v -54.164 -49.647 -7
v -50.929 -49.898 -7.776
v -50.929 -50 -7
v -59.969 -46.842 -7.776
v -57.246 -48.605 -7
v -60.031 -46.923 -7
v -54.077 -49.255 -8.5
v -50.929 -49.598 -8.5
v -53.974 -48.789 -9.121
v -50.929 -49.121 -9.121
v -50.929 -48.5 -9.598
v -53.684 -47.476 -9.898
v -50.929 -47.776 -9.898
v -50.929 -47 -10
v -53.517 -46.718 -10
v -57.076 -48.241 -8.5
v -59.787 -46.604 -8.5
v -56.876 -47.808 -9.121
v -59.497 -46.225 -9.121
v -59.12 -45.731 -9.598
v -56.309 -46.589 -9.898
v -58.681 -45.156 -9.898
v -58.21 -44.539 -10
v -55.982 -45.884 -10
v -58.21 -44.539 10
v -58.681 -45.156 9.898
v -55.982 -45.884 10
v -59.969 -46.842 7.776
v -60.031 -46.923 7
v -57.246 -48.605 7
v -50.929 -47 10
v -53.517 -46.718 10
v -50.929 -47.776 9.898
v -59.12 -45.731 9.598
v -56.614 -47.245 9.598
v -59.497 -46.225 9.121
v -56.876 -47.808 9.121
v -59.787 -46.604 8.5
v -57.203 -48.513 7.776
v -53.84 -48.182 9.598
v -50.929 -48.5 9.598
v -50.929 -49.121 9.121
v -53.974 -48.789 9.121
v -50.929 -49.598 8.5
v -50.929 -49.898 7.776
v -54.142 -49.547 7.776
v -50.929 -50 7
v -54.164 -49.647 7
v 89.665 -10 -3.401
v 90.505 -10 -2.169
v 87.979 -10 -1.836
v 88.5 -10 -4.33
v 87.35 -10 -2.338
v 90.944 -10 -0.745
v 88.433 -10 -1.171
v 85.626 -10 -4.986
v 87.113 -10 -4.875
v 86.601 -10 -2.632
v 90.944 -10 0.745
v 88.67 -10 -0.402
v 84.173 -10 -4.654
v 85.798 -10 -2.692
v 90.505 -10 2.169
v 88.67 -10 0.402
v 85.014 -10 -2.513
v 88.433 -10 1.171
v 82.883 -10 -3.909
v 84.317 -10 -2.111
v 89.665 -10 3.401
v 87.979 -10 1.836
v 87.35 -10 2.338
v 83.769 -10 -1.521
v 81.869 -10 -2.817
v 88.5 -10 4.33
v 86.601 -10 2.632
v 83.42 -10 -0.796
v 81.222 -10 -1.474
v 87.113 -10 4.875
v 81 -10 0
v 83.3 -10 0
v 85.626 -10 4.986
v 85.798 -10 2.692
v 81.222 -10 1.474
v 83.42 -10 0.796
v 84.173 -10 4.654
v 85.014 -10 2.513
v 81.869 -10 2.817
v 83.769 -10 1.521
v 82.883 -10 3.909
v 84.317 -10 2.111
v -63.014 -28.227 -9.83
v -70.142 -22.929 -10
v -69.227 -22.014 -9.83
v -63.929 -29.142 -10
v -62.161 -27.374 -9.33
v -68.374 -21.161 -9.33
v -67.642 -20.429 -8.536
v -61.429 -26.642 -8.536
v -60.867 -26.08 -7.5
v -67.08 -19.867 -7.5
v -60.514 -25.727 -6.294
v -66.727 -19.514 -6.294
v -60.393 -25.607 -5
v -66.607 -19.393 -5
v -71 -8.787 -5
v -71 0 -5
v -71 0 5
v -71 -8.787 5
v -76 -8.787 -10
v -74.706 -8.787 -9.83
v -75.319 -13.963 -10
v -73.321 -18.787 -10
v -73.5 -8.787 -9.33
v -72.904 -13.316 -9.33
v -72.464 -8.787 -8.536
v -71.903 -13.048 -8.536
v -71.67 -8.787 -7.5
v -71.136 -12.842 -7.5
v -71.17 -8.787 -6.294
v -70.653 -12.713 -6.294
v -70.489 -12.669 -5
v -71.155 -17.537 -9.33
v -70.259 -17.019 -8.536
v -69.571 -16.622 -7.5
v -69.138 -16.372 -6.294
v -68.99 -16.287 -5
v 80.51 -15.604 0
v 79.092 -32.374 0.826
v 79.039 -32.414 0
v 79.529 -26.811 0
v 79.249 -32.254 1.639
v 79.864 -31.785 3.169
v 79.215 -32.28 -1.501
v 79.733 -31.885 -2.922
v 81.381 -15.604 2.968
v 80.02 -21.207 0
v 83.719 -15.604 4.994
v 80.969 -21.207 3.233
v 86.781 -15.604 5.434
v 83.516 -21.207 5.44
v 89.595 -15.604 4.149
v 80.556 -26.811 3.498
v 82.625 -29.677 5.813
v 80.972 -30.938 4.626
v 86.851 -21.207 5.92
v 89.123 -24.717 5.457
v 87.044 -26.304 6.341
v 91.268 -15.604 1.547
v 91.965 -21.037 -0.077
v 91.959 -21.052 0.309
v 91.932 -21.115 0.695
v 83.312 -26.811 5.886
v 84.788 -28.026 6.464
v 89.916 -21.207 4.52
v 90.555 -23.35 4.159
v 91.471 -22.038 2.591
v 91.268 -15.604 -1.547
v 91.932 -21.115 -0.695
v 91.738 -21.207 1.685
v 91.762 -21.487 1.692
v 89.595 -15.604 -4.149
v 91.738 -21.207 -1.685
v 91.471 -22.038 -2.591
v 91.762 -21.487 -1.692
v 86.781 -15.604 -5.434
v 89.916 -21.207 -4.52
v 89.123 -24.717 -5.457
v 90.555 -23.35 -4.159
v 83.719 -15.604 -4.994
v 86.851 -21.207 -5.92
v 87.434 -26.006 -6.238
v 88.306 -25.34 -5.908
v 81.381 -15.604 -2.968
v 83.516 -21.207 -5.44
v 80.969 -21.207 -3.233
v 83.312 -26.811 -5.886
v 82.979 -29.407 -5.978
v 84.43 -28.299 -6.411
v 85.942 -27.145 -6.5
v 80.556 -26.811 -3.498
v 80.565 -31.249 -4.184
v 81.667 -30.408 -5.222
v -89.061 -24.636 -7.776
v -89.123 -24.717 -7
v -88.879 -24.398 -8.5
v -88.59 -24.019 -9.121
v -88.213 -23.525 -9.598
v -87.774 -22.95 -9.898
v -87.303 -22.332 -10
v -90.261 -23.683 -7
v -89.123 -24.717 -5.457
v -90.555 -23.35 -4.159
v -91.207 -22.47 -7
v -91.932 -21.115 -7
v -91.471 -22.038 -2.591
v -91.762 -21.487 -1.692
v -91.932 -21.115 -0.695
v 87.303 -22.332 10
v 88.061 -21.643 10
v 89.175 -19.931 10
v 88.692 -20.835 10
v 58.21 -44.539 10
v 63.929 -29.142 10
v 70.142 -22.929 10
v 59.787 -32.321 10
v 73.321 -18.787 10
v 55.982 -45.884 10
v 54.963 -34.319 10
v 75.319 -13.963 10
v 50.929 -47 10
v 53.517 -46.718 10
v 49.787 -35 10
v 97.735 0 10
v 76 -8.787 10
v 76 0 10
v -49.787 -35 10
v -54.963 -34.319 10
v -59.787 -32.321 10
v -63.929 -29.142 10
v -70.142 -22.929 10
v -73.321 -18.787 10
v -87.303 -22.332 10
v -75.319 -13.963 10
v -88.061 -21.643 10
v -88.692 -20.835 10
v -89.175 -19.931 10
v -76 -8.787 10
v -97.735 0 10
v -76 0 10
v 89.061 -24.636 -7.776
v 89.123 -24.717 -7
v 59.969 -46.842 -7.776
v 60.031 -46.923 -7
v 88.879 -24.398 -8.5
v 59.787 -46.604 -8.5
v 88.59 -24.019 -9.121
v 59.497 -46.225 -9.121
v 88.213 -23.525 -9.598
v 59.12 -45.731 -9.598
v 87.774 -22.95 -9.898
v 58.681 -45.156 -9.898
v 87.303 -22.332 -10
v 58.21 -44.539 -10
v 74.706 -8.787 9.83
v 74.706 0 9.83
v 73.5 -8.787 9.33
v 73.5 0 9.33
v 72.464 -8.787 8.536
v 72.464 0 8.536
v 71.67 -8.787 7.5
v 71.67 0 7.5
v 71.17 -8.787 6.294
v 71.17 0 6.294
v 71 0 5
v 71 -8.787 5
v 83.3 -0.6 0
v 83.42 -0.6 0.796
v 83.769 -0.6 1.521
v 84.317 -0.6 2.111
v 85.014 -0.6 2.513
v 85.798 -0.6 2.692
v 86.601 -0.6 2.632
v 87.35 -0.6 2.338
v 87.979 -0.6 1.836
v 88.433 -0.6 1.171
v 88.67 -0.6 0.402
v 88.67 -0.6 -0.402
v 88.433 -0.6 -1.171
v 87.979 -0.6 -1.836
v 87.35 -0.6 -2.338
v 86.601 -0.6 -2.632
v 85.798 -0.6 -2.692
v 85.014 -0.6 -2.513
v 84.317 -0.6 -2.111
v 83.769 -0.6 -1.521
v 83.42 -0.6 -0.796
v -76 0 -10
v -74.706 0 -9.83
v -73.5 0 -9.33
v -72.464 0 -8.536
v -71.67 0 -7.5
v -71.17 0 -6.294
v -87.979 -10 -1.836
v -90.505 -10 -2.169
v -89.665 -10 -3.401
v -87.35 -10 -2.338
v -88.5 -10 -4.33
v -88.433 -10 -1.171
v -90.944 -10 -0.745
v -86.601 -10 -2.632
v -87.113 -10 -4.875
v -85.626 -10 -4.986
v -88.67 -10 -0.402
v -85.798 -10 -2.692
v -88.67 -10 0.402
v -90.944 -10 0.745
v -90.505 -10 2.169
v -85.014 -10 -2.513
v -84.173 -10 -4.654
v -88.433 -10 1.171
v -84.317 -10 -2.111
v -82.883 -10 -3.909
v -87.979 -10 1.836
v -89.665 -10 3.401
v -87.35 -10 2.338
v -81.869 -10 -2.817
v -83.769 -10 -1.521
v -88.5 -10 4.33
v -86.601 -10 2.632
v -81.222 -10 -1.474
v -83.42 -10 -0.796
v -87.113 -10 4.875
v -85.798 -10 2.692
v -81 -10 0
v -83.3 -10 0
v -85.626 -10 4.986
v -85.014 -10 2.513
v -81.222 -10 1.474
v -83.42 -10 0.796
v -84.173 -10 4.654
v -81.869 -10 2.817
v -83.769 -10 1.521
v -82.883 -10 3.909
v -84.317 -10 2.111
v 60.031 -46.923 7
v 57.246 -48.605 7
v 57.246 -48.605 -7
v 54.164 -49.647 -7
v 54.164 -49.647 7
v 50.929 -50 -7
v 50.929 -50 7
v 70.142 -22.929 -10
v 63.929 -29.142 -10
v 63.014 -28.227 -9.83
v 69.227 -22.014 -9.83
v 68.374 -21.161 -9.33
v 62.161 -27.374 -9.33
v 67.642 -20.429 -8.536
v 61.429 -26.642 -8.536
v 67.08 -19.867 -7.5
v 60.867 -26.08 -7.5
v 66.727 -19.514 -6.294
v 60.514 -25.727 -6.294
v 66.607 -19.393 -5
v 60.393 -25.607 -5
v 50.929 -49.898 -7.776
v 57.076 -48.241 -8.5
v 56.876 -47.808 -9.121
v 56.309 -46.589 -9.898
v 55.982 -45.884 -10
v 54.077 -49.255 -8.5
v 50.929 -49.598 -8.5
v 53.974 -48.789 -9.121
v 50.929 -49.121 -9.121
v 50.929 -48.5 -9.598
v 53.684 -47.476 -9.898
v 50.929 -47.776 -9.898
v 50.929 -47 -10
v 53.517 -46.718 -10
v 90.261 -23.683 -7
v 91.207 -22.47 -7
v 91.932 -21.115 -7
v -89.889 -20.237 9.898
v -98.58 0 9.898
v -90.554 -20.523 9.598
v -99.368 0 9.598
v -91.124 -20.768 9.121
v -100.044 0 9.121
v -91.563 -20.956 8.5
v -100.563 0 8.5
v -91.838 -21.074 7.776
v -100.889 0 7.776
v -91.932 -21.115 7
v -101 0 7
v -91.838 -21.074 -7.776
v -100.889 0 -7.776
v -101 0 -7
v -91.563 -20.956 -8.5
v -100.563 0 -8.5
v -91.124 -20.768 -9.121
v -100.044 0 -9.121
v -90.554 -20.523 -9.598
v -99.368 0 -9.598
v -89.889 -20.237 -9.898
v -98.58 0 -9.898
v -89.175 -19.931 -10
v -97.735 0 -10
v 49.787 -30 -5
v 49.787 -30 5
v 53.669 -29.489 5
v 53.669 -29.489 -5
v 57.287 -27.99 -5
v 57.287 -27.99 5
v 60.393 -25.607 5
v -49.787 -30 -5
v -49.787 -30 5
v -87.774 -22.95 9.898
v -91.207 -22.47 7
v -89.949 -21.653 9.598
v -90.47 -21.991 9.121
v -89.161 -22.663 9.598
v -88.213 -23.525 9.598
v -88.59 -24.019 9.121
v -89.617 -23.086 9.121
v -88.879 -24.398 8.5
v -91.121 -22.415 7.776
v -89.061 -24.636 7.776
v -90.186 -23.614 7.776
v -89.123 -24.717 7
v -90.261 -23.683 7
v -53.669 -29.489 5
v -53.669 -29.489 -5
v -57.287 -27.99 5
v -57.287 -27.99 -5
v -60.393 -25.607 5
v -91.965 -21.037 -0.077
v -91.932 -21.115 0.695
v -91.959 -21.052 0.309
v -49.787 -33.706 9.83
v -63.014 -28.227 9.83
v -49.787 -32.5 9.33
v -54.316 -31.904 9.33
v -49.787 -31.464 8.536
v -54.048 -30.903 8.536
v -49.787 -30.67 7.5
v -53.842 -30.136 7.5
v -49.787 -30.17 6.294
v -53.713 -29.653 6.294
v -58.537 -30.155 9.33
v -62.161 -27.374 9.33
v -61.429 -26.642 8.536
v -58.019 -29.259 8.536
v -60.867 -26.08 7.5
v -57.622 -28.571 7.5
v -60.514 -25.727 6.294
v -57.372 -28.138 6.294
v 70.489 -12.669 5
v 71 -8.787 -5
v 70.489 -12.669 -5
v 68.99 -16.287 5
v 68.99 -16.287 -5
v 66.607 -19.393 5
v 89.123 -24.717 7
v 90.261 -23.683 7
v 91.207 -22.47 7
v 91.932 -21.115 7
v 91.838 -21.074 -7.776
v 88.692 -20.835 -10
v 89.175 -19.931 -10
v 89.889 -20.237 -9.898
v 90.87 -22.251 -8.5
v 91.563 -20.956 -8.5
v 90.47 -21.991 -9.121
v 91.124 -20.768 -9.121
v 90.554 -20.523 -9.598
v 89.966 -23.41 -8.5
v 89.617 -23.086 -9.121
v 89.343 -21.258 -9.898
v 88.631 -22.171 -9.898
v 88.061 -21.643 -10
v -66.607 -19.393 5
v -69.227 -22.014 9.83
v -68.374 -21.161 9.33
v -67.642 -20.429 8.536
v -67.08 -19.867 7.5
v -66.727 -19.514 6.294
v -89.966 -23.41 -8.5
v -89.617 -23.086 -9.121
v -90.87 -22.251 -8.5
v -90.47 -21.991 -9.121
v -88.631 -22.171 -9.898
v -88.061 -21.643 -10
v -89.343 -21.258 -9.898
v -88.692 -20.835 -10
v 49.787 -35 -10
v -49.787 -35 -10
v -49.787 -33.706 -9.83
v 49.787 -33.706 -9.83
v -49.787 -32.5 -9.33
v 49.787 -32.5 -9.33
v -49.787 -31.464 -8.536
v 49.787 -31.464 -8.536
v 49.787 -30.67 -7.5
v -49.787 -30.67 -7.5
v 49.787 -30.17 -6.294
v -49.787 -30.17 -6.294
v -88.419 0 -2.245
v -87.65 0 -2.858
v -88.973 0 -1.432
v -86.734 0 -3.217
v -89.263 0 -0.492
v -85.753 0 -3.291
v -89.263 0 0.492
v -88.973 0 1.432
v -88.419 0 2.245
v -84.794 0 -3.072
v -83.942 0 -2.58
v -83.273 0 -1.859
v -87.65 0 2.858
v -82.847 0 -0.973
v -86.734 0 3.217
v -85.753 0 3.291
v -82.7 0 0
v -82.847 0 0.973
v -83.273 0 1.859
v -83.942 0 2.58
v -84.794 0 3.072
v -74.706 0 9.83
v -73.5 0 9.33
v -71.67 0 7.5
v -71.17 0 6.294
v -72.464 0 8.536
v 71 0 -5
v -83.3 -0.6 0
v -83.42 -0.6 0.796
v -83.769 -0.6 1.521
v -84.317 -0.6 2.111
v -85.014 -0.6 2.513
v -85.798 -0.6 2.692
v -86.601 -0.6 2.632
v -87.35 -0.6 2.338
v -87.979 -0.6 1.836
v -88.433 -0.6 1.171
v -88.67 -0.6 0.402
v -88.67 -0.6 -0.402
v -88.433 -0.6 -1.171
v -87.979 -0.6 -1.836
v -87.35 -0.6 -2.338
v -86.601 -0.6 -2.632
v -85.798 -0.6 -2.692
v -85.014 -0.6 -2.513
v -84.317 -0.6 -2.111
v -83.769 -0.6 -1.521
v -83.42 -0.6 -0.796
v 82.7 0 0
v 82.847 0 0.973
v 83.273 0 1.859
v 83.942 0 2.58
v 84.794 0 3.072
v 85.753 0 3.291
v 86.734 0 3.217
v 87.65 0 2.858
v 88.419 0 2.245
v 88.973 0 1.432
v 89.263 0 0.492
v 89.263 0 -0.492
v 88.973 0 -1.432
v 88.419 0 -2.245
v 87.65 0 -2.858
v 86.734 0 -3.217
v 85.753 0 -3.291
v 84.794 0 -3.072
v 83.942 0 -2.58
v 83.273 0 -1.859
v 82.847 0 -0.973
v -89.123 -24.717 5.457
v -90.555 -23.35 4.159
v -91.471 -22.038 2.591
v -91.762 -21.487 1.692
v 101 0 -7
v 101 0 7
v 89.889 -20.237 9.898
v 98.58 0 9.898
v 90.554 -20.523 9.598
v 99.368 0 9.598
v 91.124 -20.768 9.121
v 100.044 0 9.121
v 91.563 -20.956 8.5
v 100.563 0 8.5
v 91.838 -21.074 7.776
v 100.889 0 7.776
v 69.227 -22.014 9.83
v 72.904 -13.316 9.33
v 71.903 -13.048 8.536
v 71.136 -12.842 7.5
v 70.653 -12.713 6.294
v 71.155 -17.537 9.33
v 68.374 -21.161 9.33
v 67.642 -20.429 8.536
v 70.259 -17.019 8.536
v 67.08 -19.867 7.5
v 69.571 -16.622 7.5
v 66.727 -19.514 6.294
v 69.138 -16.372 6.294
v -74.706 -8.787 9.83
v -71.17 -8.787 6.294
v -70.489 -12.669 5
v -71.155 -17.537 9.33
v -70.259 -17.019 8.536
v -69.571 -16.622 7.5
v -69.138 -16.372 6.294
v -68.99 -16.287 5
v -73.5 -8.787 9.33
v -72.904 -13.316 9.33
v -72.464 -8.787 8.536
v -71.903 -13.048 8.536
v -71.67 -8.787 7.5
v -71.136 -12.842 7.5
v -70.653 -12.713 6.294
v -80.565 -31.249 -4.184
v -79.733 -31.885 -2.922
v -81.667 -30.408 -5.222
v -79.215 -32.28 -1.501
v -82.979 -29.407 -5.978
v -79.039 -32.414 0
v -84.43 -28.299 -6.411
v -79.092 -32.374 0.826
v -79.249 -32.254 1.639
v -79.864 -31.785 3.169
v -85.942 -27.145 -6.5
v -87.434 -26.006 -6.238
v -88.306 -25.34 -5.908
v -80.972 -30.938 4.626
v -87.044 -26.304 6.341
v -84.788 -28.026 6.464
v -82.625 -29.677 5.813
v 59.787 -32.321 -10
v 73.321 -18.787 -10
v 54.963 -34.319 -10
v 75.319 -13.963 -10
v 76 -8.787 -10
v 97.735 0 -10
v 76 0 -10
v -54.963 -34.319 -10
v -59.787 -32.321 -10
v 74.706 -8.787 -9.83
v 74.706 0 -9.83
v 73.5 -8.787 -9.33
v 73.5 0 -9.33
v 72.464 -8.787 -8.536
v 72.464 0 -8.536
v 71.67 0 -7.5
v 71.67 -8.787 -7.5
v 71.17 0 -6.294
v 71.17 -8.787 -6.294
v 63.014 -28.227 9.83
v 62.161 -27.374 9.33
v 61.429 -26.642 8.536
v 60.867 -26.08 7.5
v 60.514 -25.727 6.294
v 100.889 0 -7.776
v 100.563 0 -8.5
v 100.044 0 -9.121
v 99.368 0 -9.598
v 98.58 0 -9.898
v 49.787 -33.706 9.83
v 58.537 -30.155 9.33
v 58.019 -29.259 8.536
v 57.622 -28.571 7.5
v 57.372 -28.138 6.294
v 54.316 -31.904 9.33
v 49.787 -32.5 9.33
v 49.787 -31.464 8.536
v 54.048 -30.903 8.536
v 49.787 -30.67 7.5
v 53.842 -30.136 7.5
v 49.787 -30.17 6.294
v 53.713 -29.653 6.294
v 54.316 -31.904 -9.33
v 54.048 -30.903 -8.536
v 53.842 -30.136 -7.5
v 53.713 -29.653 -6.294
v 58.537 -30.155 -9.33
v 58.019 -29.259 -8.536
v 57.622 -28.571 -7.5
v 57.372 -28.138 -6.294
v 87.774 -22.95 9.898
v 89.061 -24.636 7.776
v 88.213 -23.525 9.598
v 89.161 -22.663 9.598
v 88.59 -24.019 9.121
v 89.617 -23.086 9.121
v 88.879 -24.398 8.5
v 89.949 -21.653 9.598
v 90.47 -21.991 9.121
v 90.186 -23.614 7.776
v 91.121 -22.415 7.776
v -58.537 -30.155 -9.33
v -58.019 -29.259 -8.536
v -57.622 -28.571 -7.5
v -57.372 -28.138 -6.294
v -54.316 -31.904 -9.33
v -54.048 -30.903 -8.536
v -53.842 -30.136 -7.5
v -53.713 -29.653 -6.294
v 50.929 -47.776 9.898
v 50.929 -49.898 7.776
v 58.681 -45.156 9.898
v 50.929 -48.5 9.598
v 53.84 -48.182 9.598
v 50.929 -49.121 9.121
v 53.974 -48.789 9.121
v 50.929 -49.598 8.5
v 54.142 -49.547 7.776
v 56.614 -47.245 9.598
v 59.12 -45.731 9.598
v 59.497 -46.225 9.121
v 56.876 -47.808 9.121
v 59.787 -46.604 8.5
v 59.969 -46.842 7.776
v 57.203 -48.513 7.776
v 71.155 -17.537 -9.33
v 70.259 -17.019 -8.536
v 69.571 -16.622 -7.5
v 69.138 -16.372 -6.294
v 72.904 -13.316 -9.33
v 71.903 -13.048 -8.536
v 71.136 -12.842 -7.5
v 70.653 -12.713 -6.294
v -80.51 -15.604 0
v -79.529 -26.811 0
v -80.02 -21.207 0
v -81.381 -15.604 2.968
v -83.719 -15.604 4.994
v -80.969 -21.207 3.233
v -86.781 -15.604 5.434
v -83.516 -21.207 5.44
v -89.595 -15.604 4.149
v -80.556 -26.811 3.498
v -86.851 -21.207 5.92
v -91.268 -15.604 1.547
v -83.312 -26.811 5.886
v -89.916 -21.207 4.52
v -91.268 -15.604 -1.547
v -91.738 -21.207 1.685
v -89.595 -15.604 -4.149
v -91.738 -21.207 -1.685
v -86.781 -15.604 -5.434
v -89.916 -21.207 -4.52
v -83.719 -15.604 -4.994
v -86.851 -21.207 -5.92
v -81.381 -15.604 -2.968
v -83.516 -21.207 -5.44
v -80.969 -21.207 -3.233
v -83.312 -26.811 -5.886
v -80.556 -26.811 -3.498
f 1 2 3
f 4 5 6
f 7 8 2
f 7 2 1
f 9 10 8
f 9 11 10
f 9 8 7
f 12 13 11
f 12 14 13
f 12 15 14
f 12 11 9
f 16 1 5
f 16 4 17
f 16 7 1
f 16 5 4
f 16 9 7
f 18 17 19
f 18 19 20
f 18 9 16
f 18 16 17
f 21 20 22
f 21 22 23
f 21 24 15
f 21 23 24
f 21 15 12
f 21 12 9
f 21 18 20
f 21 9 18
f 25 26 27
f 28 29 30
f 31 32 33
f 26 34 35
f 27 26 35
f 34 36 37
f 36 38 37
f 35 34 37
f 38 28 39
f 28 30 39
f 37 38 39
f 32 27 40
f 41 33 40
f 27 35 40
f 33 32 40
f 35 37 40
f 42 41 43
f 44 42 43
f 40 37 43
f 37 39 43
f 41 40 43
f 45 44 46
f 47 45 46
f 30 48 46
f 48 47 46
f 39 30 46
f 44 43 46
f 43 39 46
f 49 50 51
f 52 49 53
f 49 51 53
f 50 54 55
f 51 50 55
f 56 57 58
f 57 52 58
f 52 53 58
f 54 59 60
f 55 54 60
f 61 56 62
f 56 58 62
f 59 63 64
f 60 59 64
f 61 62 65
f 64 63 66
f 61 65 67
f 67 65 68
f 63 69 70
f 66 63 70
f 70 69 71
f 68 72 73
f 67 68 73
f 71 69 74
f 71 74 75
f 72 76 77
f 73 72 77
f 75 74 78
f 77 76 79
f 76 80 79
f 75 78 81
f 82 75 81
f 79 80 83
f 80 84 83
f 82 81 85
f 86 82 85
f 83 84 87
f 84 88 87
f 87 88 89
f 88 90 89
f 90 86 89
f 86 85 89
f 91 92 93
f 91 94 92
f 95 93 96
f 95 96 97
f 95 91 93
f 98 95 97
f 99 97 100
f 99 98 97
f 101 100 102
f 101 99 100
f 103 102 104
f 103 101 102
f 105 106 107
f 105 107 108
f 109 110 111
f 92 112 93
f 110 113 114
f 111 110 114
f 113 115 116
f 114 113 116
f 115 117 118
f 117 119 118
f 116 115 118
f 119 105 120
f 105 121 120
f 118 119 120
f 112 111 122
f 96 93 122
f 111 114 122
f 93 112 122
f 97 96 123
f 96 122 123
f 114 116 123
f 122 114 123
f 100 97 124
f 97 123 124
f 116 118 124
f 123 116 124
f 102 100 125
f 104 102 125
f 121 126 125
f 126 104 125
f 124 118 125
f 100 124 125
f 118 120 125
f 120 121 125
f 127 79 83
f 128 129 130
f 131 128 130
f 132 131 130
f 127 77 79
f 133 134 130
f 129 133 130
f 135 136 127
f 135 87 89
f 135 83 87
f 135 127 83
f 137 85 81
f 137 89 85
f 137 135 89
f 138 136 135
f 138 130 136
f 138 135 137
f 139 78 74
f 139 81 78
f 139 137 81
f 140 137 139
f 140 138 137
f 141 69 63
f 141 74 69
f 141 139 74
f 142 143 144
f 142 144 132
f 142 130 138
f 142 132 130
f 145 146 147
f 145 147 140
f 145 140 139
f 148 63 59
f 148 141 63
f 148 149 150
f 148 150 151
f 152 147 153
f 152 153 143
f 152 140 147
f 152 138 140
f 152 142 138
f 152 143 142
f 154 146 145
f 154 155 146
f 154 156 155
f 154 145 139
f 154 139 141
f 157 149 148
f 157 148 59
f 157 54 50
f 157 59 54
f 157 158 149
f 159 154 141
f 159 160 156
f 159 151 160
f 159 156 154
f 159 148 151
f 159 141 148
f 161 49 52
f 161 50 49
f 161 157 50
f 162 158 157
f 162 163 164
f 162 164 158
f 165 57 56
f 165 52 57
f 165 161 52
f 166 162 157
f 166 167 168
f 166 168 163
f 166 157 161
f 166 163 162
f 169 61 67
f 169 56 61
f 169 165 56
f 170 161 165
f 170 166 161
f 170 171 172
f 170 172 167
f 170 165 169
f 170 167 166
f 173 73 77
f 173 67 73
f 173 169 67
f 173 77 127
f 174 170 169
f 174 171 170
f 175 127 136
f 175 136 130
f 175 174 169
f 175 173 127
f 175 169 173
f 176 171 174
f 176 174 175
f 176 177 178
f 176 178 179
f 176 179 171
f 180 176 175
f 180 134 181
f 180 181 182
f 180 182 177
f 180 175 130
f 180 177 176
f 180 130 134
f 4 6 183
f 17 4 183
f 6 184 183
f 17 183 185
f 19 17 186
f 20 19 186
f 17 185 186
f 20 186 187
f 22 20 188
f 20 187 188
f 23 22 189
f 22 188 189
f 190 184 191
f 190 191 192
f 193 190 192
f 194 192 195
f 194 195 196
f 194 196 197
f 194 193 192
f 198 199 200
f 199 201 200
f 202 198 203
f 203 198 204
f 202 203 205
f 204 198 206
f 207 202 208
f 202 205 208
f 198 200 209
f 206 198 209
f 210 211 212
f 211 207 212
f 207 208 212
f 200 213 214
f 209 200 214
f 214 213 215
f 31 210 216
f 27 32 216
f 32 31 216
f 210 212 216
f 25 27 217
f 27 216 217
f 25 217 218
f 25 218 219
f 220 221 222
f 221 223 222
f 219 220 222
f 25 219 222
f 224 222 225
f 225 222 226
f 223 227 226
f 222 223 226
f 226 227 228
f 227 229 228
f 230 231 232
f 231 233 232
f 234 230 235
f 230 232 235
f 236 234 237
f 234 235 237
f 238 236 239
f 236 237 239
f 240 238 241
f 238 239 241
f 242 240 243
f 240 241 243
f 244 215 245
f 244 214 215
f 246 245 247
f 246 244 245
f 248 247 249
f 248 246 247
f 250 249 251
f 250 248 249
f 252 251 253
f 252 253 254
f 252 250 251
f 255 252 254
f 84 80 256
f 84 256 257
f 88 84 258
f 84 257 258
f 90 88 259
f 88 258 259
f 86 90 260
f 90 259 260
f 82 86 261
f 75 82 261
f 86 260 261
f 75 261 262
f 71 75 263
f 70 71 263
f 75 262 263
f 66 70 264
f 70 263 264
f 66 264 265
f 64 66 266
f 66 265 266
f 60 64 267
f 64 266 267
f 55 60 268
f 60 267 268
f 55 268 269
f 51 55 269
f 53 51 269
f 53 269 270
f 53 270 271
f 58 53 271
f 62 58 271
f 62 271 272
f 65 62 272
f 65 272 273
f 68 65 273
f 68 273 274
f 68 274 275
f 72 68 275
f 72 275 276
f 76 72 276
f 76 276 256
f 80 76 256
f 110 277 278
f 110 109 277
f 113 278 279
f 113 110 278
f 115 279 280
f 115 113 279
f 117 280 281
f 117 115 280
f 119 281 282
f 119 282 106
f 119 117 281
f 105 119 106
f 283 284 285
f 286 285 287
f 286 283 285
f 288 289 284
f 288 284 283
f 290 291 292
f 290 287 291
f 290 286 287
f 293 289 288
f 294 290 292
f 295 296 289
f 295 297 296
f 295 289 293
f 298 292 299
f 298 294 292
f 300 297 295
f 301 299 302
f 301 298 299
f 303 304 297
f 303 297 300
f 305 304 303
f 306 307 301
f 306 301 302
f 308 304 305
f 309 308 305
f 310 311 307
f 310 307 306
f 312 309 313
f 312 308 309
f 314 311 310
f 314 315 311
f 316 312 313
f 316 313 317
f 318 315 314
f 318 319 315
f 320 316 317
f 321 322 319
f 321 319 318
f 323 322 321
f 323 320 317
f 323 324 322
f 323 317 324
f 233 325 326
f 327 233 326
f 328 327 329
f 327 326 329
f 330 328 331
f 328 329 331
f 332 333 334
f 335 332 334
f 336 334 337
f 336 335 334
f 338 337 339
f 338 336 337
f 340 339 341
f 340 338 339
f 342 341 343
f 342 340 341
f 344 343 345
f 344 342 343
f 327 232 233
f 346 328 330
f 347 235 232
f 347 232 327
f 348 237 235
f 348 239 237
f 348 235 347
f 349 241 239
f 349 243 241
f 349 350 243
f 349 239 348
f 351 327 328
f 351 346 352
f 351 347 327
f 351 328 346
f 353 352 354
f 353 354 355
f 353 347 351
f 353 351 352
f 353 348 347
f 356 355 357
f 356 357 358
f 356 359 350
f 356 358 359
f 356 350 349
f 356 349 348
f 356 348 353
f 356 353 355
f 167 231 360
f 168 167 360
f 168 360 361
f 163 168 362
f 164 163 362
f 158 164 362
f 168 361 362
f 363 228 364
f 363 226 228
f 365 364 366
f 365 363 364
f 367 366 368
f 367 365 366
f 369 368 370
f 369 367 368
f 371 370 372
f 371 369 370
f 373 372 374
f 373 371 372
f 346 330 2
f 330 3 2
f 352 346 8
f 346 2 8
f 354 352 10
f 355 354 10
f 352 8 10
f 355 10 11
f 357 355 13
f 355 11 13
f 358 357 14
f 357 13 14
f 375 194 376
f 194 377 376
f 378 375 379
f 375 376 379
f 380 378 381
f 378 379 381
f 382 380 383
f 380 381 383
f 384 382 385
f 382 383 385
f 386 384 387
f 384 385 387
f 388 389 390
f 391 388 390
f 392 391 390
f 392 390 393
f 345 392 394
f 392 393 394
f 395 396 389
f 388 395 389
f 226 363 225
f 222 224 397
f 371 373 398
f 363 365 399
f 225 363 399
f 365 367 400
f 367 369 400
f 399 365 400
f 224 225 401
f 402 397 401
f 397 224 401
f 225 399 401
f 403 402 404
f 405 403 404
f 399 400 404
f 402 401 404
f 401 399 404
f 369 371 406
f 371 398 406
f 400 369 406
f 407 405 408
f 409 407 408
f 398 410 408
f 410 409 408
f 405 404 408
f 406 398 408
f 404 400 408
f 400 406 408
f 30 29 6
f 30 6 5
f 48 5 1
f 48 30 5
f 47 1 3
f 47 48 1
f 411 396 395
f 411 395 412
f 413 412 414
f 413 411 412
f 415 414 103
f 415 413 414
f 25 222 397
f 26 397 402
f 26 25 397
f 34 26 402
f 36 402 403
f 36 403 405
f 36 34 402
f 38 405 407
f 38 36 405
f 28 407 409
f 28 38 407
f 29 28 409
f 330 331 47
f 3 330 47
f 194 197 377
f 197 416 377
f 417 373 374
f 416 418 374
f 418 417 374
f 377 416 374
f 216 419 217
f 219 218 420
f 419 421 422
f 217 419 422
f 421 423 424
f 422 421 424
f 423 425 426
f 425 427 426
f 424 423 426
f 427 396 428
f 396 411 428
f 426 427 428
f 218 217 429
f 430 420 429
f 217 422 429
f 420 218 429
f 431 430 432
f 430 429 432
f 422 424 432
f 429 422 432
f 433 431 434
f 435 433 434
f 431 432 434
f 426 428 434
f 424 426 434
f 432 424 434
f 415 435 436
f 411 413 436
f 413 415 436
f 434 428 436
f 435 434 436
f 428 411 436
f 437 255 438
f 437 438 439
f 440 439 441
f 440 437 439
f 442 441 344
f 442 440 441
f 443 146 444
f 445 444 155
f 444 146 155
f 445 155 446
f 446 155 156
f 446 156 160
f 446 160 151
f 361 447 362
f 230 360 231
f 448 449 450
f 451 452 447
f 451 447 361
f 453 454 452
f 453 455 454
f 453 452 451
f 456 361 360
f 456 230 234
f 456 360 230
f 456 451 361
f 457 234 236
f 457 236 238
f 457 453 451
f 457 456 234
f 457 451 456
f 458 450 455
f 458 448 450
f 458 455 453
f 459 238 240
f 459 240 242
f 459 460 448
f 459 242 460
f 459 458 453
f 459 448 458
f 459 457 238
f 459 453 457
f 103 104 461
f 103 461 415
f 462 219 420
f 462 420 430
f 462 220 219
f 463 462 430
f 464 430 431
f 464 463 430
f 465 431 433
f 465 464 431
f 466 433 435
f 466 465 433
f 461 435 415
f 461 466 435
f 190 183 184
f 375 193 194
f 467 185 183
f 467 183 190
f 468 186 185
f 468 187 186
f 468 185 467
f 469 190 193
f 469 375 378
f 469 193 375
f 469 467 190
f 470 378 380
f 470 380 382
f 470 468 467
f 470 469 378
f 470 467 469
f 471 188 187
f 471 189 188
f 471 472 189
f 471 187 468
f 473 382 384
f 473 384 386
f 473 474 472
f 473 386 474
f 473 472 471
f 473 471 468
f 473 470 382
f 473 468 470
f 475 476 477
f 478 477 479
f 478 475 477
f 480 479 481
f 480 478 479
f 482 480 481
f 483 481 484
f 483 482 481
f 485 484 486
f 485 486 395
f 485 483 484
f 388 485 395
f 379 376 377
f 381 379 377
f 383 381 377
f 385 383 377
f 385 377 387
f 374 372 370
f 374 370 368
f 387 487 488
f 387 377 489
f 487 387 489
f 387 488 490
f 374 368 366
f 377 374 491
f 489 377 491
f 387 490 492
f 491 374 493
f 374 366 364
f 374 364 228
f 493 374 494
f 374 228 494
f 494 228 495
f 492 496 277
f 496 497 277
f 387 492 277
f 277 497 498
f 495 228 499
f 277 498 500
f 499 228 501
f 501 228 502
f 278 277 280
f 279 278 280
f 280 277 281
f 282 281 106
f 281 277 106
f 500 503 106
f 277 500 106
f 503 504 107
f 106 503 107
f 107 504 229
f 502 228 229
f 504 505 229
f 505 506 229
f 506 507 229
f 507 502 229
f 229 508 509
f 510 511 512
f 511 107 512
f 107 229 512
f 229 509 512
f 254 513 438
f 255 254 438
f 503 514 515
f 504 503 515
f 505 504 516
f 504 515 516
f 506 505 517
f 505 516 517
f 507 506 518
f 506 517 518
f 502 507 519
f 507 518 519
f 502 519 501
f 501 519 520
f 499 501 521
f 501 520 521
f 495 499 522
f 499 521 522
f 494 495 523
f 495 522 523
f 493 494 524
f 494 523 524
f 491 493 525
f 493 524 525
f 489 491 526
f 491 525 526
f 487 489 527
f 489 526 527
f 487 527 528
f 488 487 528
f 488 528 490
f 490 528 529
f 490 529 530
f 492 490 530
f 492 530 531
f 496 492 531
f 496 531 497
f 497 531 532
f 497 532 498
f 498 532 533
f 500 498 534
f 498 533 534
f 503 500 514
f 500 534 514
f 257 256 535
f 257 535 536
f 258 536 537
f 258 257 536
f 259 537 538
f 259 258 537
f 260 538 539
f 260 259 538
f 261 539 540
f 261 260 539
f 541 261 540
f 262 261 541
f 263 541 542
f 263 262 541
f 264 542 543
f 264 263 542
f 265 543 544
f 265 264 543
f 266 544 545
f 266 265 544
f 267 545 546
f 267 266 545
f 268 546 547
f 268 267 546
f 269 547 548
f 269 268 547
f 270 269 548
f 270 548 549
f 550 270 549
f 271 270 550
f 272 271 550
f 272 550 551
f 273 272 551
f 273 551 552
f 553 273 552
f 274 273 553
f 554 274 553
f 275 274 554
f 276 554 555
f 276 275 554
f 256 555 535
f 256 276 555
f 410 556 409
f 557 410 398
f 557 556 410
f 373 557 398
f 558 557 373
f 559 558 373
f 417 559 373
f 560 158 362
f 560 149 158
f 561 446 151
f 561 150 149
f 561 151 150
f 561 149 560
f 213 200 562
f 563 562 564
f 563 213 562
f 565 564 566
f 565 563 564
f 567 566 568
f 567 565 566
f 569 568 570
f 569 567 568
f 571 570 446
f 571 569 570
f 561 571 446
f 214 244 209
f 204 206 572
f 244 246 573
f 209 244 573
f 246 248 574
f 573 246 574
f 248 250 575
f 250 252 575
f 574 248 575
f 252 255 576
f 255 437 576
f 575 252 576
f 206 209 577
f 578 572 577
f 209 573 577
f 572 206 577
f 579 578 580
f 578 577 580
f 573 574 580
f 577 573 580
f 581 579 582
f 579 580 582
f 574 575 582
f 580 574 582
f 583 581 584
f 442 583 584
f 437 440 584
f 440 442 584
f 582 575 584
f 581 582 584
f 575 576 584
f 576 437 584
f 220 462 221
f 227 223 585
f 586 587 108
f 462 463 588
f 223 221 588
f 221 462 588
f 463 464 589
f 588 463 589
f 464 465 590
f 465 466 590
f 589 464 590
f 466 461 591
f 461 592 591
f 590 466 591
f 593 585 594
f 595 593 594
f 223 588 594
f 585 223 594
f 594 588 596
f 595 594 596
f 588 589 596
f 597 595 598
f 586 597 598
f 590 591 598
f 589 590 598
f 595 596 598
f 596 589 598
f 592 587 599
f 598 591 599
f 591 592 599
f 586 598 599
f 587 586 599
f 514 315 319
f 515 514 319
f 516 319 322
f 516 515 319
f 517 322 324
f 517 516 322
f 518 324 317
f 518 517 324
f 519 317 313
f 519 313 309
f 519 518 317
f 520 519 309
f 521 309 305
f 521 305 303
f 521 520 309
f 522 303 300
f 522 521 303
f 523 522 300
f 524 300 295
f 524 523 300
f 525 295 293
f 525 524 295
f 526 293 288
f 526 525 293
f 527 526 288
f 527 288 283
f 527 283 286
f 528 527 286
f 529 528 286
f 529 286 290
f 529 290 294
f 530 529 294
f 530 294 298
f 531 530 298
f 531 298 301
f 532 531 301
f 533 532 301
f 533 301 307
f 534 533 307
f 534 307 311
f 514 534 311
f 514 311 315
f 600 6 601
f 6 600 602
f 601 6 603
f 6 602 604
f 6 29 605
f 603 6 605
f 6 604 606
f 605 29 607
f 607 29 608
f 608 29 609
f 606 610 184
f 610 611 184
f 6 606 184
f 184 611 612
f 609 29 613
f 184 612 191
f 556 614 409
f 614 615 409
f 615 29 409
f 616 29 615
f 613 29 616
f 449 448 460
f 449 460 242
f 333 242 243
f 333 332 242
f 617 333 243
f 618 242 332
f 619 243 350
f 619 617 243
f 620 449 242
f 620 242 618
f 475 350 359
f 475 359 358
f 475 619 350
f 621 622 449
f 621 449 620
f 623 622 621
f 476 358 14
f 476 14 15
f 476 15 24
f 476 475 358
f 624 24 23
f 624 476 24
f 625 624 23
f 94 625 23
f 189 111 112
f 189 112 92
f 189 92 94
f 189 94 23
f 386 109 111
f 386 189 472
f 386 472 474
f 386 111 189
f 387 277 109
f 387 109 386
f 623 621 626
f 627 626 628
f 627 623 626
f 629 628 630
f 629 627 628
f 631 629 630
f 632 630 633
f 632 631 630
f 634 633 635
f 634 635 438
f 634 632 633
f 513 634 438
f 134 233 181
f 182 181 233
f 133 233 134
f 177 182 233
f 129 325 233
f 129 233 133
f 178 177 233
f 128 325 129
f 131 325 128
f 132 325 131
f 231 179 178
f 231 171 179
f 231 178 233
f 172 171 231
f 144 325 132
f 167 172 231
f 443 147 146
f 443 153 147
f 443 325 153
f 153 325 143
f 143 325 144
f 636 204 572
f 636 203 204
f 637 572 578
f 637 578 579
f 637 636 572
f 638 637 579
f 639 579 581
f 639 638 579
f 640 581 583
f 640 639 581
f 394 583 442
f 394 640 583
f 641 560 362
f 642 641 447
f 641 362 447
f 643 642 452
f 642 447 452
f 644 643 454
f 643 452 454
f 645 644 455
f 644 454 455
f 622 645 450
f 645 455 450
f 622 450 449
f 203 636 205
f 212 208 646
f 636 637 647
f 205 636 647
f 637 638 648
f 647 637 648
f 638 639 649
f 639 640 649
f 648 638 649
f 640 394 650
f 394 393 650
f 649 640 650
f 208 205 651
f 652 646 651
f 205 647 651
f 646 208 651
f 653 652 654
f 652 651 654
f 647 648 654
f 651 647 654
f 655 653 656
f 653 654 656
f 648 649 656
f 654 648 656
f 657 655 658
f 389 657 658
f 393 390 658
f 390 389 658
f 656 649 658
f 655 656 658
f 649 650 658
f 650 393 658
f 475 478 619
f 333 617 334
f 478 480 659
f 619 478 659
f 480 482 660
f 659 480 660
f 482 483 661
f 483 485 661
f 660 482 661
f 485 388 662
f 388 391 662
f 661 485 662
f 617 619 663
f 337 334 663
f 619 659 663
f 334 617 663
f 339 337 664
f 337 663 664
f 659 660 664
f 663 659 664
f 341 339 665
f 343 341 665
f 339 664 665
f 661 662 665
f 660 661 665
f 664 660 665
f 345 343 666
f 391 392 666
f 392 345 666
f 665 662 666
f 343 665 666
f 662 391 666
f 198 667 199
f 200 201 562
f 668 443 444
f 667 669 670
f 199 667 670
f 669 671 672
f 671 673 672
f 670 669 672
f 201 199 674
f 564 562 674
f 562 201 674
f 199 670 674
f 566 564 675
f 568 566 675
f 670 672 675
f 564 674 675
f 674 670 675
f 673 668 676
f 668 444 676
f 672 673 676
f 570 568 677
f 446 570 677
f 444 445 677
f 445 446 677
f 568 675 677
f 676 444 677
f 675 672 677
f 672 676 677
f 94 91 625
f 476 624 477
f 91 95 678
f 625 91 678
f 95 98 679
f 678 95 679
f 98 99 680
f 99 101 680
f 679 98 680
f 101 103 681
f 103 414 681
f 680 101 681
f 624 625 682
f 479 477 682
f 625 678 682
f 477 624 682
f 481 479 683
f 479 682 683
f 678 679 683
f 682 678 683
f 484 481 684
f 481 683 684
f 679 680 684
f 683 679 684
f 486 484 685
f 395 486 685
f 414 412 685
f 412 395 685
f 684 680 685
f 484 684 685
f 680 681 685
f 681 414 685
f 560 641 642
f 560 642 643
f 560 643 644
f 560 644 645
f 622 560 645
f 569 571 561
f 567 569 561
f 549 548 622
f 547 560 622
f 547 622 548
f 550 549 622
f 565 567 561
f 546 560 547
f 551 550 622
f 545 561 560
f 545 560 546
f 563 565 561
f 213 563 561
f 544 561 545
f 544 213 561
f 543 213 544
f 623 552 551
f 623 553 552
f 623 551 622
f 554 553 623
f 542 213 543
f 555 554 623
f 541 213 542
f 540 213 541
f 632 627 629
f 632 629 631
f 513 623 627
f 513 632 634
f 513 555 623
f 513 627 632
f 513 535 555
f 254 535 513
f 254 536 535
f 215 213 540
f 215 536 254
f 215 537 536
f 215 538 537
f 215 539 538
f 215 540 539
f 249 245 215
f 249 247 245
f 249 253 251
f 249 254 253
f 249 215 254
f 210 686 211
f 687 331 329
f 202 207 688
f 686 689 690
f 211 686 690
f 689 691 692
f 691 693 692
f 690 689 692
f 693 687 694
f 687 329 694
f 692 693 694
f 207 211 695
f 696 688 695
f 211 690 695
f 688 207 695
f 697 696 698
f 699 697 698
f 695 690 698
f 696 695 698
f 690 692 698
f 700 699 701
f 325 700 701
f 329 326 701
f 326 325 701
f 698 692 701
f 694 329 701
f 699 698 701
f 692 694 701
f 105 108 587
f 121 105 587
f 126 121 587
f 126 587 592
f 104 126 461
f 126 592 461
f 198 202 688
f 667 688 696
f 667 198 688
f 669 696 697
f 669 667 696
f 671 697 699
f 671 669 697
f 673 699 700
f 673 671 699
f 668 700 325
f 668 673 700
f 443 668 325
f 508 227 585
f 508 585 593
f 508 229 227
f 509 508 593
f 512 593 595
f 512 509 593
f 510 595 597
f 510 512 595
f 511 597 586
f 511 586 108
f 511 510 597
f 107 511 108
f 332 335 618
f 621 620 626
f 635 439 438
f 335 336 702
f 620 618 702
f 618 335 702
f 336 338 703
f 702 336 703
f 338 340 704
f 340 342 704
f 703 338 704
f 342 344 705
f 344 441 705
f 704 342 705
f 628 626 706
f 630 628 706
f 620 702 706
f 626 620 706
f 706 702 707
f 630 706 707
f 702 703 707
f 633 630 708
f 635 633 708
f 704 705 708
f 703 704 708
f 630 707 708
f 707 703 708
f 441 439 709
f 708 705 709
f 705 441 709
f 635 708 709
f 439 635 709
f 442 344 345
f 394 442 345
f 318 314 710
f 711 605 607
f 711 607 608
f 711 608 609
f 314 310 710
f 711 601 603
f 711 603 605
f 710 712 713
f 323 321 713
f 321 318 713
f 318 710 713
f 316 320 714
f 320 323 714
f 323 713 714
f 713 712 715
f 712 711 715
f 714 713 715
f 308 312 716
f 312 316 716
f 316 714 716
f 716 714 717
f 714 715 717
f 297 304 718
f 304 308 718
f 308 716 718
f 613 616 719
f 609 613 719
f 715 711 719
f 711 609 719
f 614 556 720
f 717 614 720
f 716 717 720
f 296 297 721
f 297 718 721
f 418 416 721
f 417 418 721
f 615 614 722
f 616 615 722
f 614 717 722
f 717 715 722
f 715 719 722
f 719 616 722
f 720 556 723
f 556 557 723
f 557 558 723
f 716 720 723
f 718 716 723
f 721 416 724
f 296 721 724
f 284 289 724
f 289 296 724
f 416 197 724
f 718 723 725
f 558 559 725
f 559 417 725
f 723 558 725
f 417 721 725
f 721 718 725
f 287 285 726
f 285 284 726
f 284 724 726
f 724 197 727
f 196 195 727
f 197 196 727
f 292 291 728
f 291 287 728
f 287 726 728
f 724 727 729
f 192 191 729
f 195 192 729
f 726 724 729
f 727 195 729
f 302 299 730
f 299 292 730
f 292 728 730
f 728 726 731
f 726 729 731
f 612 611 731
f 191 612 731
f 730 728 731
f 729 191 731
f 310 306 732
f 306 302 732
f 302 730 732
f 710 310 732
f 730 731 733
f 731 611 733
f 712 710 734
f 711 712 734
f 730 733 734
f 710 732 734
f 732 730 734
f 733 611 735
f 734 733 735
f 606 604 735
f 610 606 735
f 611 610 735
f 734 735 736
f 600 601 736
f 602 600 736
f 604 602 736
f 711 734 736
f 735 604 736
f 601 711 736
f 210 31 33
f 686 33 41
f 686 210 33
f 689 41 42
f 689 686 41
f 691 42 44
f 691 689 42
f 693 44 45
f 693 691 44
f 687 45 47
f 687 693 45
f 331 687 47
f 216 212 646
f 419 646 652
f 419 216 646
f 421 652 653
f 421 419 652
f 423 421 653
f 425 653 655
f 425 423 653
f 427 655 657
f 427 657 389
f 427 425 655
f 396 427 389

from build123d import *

# Parameters (mm, degrees)
PAD_DEPTH       = 10
SKETCH001_R     = 2.7
POCKET_DEPTH    = 40
SKETCH002_R     = 5
POCKET001_DEPTH = 24
POCKET001_TAPER = -5
FILLET_R        = 9
FILLET001_R     = 15
CHAMFER_SIZE    = 0.6
FILLET002_R     = 3
FILLET003_R     = 5


with BuildPart() as part:
    # Sketch (on XY_Plane of Origin) → Pad (new body, symmetric)
    with BuildSketch(Plane.XY):
        Polygon((71, 0), (71, -15), (56, -30), (0, -30), (0, -50), (56, -50), (91, -23.284271), (101, 0), align=None)
    extrude(amount=PAD_DEPTH, both=True)

    # Sketch001 (on Face8 of Pad) → Pocket (cut)
    with BuildSketch(Plane(origin=(0, 0, 0), x_dir=(-1, 0, 0), z_dir=(0, 1, 0))):
        with Locations((-86, 0)):
            Circle(SKETCH001_R)
    extrude(amount=-POCKET_DEPTH, mode=Mode.SUBTRACT)

    # Sketch002 (on Face2 of Pocket) → Pocket001 (cut)
    with BuildSketch(Plane(origin=(0, -10, 0), x_dir=(-1, 0, 0), z_dir=(0, 1, 0))):
        with Locations((-86, 0)):
            Circle(SKETCH002_R)
    extrude(amount=-POCKET001_DEPTH, taper=POCKET001_TAPER, mode=Mode.SUBTRACT)

    # Fillet
    fillet_edges = [part.edges().sort_by_distance(p)[0] for p in [
        (91, -23.284271, 6.800902),
        (91, -23.284271, -6.800902),
    ]]
    fillet(fillet_edges, radius=FILLET_R)

    # Fillet001
    fillet001_edges = [part.edges().sort_by_distance(p)[0] for p in [
        (56, -50, 0),
        (56, -30, 0),
        (71, -15, 0),
    ]]
    fillet(fillet001_edges, radius=FILLET001_R)

    # Chamfer
    chamfer_edges = [part.edges().sort_by_distance(p)[0] for p in [
        (88.7, 0, 0),
    ]]
    chamfer(chamfer_edges, length=CHAMFER_SIZE)

    # Mirrored: part across YZ


with BuildPart() as part_1:
    add(part.part)
    add(part.part.mirror(Plane.YZ))

    # Fillet002
    fillet002_edges = [part_1.edges().sort_by_distance(p)[0] for p in [
        (0, -50, 10),
        (0, -50, -10),
    ]]
    fillet(fillet002_edges, radius=FILLET002_R)

    # Fillet003
    fillet003_edges = [part_1.edges().sort_by_distance(p)[0] for p in [
        (0, -30, 10),
        (0, -30, -10),
    ]]
    fillet(fillet003_edges, radius=FILLET003_R)


solid = part_1.part
